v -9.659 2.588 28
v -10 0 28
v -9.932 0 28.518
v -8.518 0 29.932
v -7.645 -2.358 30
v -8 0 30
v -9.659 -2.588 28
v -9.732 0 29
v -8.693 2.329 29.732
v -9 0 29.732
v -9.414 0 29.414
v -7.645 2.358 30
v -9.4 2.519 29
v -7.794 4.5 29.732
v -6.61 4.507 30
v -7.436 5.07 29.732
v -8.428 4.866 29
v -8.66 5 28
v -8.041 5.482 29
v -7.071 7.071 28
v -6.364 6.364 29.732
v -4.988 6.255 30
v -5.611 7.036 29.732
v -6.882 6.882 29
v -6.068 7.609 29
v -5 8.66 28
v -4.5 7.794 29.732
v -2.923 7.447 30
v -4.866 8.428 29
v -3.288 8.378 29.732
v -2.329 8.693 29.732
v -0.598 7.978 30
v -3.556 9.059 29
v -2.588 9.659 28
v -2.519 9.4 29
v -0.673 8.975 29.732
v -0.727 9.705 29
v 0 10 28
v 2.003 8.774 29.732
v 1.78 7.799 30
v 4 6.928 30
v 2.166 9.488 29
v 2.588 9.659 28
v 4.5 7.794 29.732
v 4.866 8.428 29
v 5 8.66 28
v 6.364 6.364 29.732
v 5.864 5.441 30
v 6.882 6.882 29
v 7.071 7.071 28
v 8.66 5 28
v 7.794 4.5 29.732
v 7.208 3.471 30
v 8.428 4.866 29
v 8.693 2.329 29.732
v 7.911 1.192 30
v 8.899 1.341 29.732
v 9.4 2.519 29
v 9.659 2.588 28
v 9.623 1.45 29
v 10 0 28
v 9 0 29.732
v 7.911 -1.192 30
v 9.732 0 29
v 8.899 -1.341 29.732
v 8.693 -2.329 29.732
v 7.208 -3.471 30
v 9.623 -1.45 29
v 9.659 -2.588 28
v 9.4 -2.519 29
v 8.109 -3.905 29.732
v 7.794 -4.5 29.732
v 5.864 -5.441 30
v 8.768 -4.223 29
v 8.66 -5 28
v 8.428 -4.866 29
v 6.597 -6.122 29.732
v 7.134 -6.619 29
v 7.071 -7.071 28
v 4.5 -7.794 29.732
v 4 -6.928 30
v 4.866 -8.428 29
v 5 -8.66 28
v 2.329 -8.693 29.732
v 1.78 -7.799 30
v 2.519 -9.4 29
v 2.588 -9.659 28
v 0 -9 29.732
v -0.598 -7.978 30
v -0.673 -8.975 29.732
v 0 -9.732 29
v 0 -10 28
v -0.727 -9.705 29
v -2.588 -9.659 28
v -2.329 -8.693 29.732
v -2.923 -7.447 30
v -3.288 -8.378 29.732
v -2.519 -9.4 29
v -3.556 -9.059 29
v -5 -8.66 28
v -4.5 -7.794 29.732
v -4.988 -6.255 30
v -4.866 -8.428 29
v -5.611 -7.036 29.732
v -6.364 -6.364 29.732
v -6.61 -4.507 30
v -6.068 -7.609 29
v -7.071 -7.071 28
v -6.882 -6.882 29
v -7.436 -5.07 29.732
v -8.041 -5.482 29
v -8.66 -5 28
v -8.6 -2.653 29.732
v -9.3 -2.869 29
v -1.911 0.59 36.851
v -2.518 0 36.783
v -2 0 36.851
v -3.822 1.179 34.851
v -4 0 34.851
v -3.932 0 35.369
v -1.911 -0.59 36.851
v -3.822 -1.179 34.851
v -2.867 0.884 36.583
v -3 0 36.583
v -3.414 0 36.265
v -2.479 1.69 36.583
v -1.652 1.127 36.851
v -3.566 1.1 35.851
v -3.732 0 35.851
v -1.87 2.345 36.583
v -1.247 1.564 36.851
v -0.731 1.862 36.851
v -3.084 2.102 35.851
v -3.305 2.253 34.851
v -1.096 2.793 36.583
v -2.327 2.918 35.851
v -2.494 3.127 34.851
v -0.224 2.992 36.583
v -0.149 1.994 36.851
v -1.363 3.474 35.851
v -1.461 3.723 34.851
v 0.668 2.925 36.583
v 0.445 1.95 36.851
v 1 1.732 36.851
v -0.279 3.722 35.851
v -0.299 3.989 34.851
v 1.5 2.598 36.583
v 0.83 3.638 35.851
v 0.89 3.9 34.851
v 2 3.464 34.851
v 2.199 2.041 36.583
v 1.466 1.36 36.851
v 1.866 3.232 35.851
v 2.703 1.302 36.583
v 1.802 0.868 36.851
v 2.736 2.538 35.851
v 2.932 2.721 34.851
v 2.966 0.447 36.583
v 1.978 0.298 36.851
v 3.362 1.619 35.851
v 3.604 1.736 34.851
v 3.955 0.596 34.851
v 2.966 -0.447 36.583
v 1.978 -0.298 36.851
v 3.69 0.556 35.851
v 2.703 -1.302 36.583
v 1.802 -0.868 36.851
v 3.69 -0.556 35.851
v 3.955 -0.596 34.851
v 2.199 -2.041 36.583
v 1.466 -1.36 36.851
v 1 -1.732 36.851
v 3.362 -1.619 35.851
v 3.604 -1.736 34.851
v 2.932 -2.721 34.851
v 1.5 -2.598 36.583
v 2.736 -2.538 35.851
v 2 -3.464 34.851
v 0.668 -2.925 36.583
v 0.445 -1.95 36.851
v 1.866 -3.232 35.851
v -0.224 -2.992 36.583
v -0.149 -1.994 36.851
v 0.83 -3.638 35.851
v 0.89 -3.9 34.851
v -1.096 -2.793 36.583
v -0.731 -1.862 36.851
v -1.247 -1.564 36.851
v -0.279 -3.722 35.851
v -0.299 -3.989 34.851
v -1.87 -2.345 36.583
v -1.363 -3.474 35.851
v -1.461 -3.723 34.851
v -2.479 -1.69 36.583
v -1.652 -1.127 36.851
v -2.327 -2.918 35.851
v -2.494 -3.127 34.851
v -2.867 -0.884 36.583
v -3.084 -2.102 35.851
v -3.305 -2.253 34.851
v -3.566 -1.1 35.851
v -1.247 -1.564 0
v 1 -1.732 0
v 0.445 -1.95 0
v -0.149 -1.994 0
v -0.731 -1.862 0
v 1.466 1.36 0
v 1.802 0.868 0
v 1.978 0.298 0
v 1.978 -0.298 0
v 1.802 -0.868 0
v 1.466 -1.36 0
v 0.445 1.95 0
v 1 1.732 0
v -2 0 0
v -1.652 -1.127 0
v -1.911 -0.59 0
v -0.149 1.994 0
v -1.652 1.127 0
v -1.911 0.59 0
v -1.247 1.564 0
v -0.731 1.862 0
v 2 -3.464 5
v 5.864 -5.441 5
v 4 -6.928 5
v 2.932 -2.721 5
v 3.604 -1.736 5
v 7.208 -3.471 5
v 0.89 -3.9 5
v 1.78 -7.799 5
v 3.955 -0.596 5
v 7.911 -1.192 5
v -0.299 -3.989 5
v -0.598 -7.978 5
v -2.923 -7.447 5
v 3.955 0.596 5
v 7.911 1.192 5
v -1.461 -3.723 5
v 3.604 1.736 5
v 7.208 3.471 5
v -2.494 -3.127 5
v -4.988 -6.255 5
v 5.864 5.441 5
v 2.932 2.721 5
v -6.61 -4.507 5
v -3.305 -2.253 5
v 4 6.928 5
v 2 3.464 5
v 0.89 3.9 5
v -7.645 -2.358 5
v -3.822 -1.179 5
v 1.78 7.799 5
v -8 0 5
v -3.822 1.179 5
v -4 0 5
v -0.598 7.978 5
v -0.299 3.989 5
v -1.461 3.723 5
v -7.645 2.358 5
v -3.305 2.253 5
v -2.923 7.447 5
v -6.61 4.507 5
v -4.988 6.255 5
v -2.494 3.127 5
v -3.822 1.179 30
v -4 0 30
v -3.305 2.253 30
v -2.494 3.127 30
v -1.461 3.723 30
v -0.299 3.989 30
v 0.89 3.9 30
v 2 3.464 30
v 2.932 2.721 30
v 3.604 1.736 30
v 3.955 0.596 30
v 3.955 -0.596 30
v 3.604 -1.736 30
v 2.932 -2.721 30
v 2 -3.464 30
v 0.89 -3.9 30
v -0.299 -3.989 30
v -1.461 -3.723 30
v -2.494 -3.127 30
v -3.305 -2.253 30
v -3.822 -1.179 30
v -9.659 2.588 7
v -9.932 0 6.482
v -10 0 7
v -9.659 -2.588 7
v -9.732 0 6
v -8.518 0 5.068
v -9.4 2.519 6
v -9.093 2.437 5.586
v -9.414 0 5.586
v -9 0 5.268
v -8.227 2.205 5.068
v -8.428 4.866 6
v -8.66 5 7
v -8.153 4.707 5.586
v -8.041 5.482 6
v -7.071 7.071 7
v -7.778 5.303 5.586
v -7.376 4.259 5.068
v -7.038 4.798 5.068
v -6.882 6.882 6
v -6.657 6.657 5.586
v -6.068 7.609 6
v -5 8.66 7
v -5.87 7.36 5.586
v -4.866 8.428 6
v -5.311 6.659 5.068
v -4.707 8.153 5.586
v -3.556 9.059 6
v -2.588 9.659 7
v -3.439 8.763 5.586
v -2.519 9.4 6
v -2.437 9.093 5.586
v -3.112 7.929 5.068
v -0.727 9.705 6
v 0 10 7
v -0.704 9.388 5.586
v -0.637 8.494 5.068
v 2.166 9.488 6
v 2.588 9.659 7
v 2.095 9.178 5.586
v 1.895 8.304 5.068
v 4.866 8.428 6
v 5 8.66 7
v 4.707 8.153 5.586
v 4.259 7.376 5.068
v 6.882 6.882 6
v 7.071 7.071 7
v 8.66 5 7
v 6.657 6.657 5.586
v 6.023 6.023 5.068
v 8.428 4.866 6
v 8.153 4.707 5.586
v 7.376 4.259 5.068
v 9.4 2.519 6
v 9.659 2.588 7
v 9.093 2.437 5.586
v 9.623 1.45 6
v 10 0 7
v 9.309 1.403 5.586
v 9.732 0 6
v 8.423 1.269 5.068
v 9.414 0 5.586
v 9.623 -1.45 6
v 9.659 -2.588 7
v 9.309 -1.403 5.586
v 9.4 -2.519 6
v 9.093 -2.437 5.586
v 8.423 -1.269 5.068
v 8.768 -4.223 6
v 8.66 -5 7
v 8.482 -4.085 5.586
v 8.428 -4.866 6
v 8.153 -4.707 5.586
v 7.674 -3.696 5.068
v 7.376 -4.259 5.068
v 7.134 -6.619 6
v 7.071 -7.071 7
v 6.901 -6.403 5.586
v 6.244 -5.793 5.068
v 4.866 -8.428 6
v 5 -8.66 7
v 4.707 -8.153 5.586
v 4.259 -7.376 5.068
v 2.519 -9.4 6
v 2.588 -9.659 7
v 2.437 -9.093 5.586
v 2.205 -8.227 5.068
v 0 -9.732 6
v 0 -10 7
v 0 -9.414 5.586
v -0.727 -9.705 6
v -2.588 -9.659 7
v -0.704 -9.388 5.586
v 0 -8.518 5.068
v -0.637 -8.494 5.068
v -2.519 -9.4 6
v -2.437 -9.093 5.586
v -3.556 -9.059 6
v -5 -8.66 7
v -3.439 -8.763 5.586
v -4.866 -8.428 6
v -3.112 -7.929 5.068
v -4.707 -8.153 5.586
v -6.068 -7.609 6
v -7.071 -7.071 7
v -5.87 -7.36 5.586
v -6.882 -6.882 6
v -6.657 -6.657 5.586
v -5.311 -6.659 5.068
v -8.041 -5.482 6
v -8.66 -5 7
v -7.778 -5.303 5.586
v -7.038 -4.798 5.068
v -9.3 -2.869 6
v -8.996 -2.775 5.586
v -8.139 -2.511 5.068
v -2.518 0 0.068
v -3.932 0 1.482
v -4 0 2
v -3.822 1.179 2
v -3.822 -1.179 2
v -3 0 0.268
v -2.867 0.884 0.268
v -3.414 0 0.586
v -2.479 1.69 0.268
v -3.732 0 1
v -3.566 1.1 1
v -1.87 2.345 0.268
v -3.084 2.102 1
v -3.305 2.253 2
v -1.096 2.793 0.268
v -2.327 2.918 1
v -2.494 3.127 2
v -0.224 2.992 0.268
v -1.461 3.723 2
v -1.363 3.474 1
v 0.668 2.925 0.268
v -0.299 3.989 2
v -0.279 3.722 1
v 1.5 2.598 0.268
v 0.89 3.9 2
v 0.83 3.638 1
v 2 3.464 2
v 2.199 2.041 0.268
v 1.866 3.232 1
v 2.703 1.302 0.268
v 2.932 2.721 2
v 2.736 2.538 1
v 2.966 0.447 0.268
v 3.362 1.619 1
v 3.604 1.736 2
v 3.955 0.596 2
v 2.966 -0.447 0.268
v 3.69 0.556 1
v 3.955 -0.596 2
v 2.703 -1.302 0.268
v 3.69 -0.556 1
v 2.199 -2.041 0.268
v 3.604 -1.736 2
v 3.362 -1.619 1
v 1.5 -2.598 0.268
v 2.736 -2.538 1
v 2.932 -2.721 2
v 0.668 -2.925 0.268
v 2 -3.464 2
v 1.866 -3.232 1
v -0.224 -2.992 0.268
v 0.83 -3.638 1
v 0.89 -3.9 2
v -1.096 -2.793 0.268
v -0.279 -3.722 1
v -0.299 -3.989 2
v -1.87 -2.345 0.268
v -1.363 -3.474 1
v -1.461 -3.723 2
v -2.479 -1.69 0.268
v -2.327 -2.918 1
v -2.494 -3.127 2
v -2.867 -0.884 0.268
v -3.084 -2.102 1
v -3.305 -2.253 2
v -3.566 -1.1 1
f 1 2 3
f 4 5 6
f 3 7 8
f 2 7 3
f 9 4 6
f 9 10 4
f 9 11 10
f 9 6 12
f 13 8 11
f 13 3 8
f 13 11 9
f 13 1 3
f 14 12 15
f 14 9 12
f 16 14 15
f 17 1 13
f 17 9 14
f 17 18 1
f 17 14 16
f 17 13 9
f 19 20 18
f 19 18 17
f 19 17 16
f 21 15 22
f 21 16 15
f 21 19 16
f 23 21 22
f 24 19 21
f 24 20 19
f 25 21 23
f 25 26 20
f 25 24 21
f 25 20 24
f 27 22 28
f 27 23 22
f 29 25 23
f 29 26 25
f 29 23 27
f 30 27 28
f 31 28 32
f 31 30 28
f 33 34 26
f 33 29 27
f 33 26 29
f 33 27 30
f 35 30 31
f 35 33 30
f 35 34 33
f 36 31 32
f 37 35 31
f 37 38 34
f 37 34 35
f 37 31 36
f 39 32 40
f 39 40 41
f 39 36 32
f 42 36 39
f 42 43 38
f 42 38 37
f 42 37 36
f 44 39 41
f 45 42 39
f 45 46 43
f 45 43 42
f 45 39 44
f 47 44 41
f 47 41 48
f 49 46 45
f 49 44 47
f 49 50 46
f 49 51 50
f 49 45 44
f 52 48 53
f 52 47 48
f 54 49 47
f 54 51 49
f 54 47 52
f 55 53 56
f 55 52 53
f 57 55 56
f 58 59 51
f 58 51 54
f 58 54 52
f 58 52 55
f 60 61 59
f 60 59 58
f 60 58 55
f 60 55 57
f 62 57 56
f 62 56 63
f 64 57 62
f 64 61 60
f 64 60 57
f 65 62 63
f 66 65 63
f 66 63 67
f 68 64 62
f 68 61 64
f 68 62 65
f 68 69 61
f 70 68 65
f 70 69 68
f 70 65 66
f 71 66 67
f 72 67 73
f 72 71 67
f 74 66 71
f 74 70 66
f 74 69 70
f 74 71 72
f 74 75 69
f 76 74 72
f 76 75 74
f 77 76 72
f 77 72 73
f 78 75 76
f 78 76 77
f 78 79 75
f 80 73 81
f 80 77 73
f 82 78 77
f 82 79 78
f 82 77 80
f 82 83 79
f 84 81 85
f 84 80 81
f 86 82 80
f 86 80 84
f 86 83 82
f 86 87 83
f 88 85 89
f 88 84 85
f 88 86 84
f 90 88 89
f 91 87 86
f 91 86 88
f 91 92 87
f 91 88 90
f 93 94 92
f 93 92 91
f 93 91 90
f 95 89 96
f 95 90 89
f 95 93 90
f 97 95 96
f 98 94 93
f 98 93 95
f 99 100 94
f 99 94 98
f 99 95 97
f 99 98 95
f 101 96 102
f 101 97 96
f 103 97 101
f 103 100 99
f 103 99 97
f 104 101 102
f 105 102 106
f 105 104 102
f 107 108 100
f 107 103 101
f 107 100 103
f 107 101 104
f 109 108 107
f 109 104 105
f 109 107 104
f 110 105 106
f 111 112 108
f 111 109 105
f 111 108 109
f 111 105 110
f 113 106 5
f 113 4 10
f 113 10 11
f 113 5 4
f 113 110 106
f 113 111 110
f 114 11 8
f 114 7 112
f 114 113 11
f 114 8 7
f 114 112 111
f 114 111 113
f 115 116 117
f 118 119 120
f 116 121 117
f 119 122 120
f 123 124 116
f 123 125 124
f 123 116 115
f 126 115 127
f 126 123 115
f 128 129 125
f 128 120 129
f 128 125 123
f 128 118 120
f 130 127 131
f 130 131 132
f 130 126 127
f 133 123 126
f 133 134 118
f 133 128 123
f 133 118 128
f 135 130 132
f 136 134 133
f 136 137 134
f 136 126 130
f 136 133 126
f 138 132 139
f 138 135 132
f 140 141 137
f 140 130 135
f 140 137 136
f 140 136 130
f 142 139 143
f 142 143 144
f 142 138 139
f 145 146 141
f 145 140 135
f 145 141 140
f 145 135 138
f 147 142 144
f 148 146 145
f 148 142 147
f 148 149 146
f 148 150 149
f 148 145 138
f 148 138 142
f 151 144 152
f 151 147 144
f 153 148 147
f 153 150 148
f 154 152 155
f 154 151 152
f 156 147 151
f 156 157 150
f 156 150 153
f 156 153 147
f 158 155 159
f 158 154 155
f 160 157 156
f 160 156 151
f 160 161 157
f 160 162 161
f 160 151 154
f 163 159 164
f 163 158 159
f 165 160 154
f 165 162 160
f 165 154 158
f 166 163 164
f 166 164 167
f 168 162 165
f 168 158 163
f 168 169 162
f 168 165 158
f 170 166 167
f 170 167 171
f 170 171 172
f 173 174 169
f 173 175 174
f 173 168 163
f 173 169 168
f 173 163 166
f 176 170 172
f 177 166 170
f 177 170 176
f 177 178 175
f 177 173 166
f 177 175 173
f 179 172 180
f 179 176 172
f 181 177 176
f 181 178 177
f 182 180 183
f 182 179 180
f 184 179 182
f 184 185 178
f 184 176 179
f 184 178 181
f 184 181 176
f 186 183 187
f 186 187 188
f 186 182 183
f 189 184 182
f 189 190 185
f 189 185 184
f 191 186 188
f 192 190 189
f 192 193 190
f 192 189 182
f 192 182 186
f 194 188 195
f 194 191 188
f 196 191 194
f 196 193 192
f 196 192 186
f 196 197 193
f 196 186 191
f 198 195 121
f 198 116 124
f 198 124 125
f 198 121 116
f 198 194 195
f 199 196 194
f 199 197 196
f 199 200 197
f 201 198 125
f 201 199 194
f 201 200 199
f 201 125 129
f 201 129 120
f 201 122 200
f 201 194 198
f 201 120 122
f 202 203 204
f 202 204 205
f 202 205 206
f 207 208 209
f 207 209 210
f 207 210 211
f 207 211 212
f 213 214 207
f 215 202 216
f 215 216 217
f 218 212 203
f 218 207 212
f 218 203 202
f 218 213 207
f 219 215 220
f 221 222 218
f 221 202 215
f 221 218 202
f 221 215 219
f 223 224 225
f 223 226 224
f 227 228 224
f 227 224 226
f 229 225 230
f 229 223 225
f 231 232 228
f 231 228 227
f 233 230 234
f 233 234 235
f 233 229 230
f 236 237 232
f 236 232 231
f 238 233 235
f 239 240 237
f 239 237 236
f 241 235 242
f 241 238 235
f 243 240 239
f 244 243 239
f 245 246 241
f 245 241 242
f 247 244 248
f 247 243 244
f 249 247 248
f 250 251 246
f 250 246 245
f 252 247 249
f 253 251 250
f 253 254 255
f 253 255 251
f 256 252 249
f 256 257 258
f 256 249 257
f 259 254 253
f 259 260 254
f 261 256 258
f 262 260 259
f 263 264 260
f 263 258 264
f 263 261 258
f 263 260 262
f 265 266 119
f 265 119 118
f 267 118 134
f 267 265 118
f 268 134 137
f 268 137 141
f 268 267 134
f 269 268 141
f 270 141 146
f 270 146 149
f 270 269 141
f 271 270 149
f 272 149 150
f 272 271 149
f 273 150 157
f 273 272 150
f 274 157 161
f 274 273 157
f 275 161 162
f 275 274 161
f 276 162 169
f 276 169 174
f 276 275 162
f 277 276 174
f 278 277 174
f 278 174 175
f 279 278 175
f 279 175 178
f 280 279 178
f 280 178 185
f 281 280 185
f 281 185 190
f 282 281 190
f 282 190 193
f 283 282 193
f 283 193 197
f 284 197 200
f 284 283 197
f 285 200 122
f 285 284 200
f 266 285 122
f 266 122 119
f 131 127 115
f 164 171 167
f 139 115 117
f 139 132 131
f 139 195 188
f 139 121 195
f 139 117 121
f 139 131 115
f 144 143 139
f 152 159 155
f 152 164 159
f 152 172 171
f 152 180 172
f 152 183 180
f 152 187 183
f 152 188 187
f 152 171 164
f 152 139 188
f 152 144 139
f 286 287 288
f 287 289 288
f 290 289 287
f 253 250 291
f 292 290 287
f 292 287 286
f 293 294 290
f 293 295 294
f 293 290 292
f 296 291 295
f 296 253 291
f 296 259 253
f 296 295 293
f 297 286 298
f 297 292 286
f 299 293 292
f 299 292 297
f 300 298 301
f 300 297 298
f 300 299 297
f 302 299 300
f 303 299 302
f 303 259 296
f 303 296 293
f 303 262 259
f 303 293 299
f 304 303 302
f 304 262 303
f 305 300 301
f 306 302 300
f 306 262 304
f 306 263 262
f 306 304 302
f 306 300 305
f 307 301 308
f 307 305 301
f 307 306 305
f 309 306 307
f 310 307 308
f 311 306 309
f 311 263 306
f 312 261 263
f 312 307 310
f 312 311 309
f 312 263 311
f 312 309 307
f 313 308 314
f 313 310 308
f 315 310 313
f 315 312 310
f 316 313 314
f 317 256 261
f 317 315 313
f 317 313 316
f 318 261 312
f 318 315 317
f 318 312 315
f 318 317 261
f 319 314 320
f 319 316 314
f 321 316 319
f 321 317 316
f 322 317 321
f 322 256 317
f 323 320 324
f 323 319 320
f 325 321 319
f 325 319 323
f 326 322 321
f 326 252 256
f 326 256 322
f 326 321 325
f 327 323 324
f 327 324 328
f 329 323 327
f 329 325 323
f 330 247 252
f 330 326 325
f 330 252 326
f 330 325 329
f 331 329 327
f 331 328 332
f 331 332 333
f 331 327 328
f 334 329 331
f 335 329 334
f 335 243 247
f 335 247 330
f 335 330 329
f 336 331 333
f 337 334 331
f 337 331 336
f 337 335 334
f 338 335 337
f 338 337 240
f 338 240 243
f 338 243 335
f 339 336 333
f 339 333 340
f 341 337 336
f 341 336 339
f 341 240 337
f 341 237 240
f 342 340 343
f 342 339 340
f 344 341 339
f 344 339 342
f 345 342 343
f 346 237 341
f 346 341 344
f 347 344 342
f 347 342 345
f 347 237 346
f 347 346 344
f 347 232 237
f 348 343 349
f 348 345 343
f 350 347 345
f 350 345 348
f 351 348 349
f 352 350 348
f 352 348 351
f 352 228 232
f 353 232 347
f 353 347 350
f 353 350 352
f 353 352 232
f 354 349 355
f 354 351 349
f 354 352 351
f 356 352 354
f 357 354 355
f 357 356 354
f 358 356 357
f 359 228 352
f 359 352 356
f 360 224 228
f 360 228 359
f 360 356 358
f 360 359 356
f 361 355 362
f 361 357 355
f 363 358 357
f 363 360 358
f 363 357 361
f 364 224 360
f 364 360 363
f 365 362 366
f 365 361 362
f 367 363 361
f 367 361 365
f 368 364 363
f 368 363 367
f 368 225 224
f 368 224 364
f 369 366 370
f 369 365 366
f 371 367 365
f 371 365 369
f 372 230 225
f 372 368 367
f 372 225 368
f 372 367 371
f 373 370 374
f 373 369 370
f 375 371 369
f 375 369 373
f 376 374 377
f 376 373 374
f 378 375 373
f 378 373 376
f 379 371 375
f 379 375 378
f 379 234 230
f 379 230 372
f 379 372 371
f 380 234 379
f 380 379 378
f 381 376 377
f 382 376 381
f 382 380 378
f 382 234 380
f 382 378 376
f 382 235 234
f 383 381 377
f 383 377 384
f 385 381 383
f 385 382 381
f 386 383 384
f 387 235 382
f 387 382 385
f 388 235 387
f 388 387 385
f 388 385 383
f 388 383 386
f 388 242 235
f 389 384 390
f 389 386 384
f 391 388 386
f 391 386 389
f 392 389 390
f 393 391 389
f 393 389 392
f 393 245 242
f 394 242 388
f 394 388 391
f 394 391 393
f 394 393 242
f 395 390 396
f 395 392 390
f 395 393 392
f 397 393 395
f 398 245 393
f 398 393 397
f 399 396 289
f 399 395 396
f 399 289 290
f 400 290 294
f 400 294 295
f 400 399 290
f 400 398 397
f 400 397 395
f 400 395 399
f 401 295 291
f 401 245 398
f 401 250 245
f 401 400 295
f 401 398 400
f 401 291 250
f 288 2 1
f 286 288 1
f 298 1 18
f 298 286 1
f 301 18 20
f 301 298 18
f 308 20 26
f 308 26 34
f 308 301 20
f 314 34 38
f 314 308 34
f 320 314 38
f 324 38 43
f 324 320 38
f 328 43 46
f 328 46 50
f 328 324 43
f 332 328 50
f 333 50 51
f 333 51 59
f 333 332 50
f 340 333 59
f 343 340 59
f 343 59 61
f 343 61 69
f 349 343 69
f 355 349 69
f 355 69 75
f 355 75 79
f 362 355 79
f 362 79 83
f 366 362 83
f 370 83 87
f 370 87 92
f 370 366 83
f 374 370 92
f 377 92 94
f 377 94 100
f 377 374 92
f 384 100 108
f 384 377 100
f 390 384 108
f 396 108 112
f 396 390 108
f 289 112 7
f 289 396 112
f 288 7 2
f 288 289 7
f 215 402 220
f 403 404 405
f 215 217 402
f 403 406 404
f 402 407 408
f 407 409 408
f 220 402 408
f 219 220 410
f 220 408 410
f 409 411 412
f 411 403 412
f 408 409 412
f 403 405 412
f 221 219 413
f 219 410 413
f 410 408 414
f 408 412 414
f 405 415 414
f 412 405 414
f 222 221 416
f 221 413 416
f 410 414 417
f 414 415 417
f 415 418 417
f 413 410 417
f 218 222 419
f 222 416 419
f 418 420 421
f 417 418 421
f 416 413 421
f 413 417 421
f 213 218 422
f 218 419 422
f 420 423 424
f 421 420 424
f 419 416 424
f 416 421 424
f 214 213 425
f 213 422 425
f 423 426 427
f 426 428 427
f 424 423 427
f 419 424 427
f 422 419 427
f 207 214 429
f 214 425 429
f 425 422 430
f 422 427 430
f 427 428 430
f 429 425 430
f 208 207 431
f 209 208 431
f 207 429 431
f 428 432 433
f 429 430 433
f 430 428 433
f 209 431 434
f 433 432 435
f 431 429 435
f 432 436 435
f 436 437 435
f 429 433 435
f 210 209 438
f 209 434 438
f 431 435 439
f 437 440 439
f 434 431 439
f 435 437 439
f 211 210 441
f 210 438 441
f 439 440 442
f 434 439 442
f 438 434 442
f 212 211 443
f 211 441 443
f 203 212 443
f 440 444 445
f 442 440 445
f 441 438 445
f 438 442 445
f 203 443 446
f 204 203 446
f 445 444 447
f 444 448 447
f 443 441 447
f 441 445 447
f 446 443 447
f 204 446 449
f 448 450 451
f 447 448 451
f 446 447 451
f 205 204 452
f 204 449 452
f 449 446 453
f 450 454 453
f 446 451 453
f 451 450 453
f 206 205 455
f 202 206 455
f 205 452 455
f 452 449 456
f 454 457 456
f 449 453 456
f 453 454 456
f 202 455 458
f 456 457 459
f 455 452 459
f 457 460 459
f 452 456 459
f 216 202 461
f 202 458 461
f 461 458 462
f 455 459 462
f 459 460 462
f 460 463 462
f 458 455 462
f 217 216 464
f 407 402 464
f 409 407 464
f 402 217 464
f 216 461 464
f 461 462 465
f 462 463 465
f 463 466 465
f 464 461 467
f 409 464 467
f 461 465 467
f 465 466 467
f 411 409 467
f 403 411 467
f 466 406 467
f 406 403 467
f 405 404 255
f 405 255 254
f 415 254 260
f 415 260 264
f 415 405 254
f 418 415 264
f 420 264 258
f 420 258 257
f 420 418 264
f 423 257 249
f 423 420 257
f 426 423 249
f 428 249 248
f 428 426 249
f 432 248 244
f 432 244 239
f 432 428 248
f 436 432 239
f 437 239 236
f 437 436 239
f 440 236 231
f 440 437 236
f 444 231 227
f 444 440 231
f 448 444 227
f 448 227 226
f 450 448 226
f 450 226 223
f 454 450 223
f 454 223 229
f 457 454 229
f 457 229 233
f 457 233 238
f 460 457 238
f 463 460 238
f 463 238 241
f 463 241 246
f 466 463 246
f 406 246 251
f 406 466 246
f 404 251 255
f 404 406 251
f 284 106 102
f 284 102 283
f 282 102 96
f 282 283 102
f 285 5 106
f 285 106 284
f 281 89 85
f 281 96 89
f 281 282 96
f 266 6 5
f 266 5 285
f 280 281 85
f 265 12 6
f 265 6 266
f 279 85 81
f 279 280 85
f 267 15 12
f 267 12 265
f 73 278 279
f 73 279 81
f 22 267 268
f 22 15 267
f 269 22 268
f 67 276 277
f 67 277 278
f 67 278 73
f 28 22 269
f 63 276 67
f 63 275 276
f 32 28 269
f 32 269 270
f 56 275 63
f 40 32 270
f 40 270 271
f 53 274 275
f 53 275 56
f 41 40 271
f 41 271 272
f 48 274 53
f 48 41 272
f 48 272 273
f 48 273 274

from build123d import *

# Parameters (mm, degrees)
F2_R = 2


with BuildPart() as f1:
    # F0 (on Front) → F1 (revolve)
    with BuildSketch(Plane.XZ):
        Polygon((-4, 0), (0, 0), (0, 36.851066), (-4, 36.851066), (-4, 30), (-10, 30), (-10, 5), (-4, 5), align=None)
    revolve(axis=Axis((0, 0, 18.425533), (0, 0, -1)))

    # F2
    f2_edges = [f1.edges().sort_by_distance(p)[0] for p in [
        (10, 0, 30),
        (10, 0, 5),
        (4, 0, 0),
        (4, 0, 36.851066),
    ]]
    fillet(f2_edges, radius=F2_R)


solid = f1.part
